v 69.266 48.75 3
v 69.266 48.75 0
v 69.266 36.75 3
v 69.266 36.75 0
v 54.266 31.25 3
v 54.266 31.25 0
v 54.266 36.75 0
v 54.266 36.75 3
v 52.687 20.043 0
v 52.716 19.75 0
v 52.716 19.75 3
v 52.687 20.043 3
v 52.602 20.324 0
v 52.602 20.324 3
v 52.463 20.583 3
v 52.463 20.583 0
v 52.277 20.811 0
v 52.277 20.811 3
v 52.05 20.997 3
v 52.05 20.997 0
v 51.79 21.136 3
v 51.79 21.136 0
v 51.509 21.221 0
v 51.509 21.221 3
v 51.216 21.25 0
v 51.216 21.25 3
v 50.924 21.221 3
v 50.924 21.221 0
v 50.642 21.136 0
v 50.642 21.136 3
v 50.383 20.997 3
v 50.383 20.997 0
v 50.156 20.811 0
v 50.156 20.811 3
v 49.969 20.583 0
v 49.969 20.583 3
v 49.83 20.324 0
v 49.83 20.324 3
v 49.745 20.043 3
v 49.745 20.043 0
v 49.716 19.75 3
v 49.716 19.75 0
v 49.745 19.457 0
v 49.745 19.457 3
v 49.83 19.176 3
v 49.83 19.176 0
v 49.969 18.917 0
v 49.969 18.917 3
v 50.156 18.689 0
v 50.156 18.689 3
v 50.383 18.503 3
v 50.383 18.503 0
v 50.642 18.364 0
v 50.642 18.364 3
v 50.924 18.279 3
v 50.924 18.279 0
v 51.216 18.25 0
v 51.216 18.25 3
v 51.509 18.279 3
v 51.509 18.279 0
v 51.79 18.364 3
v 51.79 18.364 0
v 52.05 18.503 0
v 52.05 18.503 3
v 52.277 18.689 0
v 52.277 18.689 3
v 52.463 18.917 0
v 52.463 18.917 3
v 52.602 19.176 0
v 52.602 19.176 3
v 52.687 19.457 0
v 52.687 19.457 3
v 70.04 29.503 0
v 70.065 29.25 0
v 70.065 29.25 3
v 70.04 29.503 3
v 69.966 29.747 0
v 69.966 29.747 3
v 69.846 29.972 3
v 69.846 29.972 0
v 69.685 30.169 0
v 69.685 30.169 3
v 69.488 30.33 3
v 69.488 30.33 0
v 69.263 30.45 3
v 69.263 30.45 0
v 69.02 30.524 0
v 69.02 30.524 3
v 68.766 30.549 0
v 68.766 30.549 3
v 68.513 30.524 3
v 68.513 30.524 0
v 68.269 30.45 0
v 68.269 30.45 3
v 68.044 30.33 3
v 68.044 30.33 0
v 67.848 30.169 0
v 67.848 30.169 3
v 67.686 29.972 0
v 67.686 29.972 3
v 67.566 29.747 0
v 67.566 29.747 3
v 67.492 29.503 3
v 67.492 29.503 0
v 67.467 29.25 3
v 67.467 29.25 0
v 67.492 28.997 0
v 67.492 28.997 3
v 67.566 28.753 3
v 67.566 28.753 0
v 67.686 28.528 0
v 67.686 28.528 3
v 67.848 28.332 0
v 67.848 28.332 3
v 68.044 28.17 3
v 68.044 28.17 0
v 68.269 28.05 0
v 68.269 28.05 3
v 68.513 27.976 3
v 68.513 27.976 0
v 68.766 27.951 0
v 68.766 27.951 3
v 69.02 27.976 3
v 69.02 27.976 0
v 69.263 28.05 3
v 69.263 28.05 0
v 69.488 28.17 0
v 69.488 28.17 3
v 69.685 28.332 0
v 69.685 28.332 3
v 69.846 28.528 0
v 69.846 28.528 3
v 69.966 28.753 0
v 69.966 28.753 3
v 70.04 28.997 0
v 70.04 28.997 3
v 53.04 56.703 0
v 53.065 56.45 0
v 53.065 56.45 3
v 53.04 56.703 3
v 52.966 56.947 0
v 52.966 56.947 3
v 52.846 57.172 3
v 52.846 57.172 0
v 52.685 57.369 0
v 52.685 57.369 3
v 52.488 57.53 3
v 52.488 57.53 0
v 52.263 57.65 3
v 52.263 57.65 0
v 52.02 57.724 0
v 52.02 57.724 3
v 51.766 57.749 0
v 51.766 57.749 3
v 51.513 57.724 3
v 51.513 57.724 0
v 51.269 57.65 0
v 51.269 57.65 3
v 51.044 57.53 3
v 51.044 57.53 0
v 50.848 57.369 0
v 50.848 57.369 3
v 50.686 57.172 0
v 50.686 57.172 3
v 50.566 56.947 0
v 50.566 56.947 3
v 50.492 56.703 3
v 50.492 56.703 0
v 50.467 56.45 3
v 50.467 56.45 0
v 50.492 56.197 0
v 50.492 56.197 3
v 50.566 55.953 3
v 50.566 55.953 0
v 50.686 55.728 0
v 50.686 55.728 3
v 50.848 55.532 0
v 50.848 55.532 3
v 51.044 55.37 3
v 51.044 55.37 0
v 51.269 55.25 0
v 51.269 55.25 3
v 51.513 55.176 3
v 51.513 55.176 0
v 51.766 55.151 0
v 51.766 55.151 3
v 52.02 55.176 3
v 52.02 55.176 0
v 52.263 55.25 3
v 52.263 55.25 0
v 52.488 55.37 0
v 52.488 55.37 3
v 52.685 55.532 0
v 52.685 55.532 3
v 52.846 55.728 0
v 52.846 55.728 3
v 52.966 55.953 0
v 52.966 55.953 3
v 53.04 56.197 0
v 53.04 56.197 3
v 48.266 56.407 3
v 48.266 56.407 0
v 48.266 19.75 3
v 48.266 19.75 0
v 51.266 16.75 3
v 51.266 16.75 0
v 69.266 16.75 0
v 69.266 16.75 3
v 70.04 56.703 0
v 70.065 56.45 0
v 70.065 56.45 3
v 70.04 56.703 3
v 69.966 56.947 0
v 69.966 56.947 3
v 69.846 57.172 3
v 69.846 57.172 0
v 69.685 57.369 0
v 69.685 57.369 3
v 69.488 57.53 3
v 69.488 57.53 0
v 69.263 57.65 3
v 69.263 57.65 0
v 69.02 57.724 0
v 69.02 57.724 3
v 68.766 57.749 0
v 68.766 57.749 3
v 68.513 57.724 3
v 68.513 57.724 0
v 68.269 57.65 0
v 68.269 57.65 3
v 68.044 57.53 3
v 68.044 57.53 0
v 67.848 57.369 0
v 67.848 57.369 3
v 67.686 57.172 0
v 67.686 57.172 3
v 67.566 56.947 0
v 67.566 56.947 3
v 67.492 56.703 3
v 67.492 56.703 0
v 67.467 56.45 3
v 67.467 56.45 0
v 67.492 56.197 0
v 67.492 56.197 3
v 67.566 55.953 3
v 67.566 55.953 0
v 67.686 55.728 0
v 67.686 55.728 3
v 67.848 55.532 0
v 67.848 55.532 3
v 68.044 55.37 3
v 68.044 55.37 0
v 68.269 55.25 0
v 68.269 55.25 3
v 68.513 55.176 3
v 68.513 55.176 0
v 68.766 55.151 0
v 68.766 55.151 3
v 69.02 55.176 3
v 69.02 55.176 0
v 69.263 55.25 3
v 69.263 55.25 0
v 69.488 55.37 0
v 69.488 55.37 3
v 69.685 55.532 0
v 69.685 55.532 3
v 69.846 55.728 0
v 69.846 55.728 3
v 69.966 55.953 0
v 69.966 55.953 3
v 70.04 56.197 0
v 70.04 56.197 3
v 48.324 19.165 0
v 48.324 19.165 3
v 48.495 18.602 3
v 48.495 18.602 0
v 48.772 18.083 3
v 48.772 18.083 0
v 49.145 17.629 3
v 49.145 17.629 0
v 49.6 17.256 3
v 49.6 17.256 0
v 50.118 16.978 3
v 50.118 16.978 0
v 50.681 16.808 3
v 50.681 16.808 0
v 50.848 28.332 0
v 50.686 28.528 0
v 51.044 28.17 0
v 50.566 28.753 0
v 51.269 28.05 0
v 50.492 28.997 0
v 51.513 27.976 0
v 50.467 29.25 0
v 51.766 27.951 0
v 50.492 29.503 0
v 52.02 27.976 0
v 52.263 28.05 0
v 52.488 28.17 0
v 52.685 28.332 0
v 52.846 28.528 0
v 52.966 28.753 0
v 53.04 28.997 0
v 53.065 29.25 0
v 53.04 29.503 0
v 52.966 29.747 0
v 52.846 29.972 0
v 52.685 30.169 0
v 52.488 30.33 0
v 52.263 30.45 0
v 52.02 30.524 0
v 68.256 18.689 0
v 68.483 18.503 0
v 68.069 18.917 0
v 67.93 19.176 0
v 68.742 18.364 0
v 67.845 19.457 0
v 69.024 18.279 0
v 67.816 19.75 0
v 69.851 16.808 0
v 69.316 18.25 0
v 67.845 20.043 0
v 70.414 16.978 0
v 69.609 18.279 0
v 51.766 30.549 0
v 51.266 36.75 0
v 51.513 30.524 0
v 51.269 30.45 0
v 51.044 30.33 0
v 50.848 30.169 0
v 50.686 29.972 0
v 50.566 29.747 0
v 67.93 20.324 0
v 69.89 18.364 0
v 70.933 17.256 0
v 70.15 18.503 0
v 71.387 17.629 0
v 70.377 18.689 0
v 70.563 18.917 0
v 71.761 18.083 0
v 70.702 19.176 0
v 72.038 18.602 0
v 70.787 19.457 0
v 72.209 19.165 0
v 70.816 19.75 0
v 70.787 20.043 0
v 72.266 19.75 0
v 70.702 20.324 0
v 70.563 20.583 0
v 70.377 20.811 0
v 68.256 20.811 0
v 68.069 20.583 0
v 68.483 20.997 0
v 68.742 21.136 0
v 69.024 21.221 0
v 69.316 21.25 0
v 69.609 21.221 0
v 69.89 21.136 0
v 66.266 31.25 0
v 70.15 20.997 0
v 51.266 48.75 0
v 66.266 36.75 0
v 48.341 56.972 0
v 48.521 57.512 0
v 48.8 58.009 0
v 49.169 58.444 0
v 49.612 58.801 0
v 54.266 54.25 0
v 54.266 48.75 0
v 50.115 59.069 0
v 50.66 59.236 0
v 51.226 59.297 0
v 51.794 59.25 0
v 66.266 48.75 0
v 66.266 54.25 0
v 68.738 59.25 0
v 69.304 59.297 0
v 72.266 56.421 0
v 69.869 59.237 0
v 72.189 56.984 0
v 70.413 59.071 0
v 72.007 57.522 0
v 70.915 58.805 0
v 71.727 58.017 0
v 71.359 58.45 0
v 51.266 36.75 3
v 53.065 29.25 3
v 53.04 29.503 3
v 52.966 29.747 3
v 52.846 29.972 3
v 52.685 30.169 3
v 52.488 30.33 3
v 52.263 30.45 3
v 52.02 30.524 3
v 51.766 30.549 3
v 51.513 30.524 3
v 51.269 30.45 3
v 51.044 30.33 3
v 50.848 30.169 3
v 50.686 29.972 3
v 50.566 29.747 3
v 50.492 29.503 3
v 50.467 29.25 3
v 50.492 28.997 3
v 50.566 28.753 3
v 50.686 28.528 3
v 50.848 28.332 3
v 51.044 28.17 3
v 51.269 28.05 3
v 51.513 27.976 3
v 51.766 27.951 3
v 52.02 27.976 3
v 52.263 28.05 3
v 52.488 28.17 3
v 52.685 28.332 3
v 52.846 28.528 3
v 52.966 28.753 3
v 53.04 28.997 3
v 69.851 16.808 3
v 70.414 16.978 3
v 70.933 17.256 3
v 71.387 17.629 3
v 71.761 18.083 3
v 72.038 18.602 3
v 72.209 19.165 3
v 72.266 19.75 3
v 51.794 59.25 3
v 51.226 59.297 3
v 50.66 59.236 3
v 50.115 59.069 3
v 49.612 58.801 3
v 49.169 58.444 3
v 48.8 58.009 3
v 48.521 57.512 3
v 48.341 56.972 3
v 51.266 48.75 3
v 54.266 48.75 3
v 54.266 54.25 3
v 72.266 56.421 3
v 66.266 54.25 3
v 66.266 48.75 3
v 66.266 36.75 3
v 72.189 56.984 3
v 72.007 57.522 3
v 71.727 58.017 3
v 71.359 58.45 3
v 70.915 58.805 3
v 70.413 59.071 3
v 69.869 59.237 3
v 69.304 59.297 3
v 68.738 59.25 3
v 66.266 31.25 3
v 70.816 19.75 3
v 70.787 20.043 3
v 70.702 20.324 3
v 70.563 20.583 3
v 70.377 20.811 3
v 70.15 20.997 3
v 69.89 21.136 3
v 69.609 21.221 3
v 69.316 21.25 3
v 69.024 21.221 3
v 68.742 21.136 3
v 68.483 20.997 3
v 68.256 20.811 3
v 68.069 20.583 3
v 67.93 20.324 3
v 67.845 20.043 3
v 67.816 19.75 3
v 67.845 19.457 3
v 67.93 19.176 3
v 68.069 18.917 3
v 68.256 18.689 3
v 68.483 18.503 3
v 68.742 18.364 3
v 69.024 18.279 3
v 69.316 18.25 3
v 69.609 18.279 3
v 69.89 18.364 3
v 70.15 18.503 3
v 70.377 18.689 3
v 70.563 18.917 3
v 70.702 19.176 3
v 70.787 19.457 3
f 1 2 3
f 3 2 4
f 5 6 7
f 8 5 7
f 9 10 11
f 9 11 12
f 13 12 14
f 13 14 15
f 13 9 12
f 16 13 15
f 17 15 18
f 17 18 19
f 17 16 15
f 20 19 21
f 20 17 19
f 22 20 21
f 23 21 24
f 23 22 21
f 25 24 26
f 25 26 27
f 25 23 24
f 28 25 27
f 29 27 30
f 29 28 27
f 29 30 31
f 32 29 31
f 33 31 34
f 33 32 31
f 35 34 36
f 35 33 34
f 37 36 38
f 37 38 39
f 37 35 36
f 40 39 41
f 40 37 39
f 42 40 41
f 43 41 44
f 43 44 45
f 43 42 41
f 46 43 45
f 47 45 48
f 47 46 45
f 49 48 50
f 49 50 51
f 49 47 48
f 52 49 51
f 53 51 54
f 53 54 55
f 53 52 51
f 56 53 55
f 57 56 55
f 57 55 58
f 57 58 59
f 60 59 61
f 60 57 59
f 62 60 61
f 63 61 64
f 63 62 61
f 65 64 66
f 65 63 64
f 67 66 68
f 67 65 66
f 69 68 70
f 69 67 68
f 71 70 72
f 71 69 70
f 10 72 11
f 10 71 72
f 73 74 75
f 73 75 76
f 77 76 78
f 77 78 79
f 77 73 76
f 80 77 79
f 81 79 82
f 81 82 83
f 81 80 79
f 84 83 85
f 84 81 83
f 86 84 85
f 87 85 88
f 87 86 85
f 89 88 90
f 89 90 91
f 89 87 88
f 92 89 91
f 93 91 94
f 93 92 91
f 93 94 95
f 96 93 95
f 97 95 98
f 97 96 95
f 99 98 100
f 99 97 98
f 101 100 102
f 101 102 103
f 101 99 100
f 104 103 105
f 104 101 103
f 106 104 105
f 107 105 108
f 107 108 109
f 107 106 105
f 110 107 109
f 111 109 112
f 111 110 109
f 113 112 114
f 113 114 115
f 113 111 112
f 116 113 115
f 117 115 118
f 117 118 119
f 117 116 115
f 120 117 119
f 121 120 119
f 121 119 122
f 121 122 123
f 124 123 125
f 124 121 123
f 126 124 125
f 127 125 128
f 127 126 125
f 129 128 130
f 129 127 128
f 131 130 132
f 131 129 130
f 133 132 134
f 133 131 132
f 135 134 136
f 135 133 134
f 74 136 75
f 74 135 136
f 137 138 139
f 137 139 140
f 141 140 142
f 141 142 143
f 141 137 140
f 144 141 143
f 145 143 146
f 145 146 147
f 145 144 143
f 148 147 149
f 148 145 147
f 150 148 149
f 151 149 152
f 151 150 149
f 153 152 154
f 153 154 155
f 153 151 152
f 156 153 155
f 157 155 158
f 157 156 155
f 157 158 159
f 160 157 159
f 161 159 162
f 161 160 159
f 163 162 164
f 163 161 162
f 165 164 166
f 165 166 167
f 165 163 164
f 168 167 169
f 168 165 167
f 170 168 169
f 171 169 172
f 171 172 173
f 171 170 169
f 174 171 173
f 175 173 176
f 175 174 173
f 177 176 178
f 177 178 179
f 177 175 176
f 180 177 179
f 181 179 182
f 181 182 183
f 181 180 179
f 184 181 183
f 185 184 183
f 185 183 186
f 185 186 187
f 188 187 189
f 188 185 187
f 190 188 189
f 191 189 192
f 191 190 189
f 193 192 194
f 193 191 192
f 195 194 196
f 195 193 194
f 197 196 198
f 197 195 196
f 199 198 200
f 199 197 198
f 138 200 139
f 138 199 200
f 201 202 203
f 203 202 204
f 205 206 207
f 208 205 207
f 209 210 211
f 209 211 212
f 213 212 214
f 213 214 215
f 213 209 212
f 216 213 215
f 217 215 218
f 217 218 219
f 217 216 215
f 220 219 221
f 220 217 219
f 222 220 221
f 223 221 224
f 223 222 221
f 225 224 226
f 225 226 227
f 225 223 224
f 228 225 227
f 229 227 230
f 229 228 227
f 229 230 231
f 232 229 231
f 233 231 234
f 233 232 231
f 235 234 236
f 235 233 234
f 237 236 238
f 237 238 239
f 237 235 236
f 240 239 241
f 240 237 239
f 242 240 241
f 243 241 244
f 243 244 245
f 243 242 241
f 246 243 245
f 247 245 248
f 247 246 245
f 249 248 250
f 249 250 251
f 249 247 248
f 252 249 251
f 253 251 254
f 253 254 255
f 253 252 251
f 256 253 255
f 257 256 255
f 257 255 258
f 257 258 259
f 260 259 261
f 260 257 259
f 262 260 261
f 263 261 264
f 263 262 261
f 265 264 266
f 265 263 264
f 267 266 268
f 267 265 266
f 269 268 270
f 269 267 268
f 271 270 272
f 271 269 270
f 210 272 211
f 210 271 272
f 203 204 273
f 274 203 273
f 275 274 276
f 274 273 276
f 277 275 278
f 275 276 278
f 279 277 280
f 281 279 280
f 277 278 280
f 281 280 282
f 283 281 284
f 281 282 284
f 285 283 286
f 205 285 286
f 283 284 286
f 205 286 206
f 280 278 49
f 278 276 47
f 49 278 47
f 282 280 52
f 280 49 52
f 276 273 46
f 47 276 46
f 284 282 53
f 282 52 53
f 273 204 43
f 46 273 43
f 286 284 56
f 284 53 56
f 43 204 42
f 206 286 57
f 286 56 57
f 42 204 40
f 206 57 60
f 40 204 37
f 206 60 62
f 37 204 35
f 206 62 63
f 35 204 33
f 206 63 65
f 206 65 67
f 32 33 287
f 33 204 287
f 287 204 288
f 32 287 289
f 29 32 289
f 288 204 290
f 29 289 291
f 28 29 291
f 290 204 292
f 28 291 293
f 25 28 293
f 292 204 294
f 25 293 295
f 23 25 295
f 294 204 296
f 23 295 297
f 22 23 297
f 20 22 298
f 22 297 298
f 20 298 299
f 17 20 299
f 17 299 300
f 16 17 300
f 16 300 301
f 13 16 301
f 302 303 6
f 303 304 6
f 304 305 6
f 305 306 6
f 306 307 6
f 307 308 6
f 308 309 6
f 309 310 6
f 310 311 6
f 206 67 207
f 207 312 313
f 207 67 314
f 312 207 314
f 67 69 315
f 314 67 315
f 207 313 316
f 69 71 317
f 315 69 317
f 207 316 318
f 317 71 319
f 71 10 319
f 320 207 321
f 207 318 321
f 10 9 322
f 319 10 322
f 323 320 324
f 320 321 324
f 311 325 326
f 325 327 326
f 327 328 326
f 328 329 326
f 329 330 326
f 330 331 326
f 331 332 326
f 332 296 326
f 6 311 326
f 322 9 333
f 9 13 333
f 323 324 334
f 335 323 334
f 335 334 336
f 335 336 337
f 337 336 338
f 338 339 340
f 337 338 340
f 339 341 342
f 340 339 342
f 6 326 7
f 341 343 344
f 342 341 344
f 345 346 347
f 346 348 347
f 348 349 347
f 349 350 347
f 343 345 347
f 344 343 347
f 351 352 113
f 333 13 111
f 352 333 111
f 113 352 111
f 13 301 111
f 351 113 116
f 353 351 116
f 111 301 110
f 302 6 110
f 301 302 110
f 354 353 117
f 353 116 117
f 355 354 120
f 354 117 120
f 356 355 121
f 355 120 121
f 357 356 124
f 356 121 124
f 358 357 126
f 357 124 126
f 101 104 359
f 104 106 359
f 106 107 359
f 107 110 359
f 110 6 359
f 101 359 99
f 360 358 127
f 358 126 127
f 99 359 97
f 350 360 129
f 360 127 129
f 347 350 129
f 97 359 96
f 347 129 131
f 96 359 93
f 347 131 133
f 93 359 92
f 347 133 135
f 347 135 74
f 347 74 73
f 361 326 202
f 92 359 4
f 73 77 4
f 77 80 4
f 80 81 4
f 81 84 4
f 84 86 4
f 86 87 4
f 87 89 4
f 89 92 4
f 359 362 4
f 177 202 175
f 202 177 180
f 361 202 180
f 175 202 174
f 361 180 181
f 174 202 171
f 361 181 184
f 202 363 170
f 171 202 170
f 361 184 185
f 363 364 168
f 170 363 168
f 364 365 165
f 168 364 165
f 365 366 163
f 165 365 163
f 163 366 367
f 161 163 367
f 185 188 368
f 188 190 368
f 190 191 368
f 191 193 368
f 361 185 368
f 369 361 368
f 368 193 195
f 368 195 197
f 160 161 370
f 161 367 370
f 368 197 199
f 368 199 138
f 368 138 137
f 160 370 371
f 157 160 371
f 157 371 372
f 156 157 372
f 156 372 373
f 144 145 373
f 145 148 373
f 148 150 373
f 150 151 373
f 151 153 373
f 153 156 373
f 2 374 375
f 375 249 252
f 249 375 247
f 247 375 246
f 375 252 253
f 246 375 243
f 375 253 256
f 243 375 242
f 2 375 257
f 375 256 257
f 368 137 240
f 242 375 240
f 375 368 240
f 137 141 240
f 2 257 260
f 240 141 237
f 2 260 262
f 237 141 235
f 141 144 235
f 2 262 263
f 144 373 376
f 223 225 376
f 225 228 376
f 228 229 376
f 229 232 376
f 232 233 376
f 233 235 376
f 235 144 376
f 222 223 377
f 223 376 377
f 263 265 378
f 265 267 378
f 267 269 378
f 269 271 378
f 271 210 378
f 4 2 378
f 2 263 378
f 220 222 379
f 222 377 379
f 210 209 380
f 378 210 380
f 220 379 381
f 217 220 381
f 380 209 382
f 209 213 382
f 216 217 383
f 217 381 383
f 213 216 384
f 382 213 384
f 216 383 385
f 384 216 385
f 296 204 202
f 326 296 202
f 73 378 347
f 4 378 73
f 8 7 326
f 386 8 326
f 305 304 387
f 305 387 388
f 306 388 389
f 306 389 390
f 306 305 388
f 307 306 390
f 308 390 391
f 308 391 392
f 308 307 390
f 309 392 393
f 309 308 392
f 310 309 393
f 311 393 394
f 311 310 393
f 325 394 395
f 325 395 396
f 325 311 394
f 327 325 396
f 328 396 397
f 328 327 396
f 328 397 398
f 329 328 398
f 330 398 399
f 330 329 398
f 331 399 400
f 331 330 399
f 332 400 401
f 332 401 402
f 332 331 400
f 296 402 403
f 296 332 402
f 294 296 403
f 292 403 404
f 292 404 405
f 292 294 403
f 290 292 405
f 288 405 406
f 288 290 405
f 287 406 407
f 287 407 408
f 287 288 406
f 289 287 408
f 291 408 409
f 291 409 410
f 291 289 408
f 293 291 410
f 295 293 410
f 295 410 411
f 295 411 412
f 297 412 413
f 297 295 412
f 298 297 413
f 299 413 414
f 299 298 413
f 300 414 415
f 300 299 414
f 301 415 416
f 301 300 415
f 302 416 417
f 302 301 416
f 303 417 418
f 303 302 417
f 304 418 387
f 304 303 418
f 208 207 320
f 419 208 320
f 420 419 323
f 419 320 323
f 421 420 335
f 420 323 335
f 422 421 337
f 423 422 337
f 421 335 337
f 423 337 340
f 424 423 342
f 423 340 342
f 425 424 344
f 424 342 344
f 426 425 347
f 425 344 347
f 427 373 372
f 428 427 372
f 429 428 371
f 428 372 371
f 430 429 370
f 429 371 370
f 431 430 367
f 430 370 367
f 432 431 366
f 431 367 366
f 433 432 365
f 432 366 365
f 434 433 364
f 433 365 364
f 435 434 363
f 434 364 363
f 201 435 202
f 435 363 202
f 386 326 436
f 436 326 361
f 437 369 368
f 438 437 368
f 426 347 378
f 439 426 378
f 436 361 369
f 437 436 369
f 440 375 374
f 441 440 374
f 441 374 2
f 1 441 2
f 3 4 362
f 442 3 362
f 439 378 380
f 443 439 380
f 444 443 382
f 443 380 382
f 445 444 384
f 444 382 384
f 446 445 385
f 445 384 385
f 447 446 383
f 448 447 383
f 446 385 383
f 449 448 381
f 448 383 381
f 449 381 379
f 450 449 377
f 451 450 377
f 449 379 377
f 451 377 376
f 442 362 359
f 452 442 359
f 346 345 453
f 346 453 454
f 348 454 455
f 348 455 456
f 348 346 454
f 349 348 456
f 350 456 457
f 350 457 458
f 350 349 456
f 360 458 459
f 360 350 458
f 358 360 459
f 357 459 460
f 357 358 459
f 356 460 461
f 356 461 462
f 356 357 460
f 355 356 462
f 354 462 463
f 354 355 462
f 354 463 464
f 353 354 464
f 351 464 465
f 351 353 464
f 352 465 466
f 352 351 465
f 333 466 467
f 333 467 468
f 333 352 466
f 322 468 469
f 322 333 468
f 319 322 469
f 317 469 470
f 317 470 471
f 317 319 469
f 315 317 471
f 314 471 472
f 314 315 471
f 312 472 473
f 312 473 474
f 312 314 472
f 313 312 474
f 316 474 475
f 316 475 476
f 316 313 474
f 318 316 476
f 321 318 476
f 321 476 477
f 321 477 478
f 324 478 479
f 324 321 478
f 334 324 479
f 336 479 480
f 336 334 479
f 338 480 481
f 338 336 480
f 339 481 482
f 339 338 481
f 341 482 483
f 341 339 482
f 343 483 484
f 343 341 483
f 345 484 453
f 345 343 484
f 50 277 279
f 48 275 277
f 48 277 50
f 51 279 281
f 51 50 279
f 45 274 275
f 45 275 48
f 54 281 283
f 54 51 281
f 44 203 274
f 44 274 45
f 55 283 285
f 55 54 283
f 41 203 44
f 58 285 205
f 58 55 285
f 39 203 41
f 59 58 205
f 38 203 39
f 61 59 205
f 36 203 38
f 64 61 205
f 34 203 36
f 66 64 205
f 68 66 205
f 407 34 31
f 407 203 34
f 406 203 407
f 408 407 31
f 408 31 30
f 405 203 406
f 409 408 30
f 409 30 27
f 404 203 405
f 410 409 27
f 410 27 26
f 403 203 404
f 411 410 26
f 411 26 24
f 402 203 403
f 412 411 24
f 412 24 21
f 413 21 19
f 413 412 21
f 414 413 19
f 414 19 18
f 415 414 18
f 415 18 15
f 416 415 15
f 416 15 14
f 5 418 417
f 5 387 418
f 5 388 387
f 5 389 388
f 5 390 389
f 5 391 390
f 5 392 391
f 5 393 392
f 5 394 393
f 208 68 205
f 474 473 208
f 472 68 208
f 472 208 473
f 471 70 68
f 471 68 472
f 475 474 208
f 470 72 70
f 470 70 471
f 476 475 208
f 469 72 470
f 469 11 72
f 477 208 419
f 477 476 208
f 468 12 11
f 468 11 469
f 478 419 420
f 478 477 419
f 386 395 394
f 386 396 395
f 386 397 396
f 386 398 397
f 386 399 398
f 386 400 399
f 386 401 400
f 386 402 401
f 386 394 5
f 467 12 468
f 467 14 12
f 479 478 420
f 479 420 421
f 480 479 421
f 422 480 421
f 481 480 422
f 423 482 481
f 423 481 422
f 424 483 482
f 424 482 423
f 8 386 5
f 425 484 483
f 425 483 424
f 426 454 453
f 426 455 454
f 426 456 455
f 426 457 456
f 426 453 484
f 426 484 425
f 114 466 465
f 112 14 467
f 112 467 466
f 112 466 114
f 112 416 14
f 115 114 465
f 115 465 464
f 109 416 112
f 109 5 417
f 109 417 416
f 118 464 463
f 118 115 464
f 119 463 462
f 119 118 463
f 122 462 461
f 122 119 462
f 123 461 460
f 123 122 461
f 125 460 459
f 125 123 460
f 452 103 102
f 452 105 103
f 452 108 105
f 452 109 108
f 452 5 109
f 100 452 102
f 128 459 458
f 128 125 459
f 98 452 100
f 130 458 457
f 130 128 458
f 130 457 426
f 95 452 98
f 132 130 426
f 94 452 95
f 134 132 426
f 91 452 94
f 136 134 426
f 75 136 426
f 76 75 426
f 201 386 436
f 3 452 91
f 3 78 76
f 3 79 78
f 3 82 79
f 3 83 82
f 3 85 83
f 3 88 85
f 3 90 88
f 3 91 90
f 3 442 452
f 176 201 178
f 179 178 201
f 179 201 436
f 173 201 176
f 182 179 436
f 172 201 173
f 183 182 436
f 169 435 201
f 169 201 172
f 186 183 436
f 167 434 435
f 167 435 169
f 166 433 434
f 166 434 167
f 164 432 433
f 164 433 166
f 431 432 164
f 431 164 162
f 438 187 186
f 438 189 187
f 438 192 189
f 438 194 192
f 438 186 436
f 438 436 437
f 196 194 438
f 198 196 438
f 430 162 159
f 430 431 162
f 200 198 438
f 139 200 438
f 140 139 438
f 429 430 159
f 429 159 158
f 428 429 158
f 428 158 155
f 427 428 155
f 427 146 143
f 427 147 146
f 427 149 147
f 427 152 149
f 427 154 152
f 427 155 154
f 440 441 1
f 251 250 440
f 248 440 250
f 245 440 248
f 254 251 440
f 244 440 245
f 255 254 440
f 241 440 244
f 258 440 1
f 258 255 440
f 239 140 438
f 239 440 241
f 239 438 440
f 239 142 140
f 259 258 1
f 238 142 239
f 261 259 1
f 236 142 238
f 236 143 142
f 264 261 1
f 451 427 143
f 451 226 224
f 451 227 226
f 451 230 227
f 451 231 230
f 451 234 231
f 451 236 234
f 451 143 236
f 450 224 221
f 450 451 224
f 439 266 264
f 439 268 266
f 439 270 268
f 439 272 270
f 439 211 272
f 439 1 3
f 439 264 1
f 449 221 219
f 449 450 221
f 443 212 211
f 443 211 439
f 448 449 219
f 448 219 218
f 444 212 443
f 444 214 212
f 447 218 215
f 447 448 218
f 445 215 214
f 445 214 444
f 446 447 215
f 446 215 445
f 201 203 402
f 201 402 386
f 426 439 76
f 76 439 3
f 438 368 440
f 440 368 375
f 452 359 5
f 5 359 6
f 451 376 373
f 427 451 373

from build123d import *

# Parameters (mm, degrees)
MODEL_R             = 1.298950001
MODEL_R_2           = 1.499950004
BOSS_EXTRUDE1_DEPTH = 3


with BuildPart() as part:
    # Model → Boss-Extrude1 (new body)
    with BuildSketch(Plane.XY):
        with BuildLine():
            Line((72.2662, 46.25), (72.2662, 56.421043711))
            ThreePointArc((72.2662, 56.421043711), (71.145459643, 58.637903109), (68.738, 59.25))
            Line((68.738, 59.25), (51.7943, 59.25))
            ThreePointArc((51.7943, 59.25), (49.381832487, 58.63325007), (48.2662, 56.4071))
            Line((48.2662, 56.4071), (48.2662, 46.25))
            Line((48.2662, 46.25), (48.2662, 19.75))
            ThreePointArc((48.2662, 19.75), (49.144899998, 17.628699998), (51.2662, 16.75))
            Line((51.2662, 16.75), (69.2662, 16.75))
            ThreePointArc((69.2662, 16.75), (71.387450001, 17.628749999), (72.2662, 19.75))
            Line((72.2662, 19.75), (72.2662, 46.25))
        make_face()
        with Locations((51.76615, 56.45005)):
            Circle(MODEL_R, mode=Mode.SUBTRACT)
        with Locations((68.76615, 56.45005)):
            Circle(MODEL_R, mode=Mode.SUBTRACT)
        with Locations((51.76615, 29.25005)):
            Circle(MODEL_R, mode=Mode.SUBTRACT)
        with Locations((68.76615, 29.25005)):
            Circle(MODEL_R, mode=Mode.SUBTRACT)
        with Locations((51.216249997, 19.750049997)):
            Circle(MODEL_R_2, mode=Mode.SUBTRACT)
        with Locations((69.316249997, 19.750049997)):
            Circle(MODEL_R_2, mode=Mode.SUBTRACT)
        Polygon((69.2662, 48.75), (69.2662, 36.75), (66.2662, 36.75), (66.2662, 31.25), (54.2662, 31.25), (54.2662, 36.75), (51.2662, 36.75), (51.2662, 48.75), (54.2662, 48.75), (54.2662, 54.25), (66.2662, 54.25), (66.2662, 48.75), align=None, mode=Mode.SUBTRACT)
    extrude(amount=BOSS_EXTRUDE1_DEPTH)


solid = part.part
